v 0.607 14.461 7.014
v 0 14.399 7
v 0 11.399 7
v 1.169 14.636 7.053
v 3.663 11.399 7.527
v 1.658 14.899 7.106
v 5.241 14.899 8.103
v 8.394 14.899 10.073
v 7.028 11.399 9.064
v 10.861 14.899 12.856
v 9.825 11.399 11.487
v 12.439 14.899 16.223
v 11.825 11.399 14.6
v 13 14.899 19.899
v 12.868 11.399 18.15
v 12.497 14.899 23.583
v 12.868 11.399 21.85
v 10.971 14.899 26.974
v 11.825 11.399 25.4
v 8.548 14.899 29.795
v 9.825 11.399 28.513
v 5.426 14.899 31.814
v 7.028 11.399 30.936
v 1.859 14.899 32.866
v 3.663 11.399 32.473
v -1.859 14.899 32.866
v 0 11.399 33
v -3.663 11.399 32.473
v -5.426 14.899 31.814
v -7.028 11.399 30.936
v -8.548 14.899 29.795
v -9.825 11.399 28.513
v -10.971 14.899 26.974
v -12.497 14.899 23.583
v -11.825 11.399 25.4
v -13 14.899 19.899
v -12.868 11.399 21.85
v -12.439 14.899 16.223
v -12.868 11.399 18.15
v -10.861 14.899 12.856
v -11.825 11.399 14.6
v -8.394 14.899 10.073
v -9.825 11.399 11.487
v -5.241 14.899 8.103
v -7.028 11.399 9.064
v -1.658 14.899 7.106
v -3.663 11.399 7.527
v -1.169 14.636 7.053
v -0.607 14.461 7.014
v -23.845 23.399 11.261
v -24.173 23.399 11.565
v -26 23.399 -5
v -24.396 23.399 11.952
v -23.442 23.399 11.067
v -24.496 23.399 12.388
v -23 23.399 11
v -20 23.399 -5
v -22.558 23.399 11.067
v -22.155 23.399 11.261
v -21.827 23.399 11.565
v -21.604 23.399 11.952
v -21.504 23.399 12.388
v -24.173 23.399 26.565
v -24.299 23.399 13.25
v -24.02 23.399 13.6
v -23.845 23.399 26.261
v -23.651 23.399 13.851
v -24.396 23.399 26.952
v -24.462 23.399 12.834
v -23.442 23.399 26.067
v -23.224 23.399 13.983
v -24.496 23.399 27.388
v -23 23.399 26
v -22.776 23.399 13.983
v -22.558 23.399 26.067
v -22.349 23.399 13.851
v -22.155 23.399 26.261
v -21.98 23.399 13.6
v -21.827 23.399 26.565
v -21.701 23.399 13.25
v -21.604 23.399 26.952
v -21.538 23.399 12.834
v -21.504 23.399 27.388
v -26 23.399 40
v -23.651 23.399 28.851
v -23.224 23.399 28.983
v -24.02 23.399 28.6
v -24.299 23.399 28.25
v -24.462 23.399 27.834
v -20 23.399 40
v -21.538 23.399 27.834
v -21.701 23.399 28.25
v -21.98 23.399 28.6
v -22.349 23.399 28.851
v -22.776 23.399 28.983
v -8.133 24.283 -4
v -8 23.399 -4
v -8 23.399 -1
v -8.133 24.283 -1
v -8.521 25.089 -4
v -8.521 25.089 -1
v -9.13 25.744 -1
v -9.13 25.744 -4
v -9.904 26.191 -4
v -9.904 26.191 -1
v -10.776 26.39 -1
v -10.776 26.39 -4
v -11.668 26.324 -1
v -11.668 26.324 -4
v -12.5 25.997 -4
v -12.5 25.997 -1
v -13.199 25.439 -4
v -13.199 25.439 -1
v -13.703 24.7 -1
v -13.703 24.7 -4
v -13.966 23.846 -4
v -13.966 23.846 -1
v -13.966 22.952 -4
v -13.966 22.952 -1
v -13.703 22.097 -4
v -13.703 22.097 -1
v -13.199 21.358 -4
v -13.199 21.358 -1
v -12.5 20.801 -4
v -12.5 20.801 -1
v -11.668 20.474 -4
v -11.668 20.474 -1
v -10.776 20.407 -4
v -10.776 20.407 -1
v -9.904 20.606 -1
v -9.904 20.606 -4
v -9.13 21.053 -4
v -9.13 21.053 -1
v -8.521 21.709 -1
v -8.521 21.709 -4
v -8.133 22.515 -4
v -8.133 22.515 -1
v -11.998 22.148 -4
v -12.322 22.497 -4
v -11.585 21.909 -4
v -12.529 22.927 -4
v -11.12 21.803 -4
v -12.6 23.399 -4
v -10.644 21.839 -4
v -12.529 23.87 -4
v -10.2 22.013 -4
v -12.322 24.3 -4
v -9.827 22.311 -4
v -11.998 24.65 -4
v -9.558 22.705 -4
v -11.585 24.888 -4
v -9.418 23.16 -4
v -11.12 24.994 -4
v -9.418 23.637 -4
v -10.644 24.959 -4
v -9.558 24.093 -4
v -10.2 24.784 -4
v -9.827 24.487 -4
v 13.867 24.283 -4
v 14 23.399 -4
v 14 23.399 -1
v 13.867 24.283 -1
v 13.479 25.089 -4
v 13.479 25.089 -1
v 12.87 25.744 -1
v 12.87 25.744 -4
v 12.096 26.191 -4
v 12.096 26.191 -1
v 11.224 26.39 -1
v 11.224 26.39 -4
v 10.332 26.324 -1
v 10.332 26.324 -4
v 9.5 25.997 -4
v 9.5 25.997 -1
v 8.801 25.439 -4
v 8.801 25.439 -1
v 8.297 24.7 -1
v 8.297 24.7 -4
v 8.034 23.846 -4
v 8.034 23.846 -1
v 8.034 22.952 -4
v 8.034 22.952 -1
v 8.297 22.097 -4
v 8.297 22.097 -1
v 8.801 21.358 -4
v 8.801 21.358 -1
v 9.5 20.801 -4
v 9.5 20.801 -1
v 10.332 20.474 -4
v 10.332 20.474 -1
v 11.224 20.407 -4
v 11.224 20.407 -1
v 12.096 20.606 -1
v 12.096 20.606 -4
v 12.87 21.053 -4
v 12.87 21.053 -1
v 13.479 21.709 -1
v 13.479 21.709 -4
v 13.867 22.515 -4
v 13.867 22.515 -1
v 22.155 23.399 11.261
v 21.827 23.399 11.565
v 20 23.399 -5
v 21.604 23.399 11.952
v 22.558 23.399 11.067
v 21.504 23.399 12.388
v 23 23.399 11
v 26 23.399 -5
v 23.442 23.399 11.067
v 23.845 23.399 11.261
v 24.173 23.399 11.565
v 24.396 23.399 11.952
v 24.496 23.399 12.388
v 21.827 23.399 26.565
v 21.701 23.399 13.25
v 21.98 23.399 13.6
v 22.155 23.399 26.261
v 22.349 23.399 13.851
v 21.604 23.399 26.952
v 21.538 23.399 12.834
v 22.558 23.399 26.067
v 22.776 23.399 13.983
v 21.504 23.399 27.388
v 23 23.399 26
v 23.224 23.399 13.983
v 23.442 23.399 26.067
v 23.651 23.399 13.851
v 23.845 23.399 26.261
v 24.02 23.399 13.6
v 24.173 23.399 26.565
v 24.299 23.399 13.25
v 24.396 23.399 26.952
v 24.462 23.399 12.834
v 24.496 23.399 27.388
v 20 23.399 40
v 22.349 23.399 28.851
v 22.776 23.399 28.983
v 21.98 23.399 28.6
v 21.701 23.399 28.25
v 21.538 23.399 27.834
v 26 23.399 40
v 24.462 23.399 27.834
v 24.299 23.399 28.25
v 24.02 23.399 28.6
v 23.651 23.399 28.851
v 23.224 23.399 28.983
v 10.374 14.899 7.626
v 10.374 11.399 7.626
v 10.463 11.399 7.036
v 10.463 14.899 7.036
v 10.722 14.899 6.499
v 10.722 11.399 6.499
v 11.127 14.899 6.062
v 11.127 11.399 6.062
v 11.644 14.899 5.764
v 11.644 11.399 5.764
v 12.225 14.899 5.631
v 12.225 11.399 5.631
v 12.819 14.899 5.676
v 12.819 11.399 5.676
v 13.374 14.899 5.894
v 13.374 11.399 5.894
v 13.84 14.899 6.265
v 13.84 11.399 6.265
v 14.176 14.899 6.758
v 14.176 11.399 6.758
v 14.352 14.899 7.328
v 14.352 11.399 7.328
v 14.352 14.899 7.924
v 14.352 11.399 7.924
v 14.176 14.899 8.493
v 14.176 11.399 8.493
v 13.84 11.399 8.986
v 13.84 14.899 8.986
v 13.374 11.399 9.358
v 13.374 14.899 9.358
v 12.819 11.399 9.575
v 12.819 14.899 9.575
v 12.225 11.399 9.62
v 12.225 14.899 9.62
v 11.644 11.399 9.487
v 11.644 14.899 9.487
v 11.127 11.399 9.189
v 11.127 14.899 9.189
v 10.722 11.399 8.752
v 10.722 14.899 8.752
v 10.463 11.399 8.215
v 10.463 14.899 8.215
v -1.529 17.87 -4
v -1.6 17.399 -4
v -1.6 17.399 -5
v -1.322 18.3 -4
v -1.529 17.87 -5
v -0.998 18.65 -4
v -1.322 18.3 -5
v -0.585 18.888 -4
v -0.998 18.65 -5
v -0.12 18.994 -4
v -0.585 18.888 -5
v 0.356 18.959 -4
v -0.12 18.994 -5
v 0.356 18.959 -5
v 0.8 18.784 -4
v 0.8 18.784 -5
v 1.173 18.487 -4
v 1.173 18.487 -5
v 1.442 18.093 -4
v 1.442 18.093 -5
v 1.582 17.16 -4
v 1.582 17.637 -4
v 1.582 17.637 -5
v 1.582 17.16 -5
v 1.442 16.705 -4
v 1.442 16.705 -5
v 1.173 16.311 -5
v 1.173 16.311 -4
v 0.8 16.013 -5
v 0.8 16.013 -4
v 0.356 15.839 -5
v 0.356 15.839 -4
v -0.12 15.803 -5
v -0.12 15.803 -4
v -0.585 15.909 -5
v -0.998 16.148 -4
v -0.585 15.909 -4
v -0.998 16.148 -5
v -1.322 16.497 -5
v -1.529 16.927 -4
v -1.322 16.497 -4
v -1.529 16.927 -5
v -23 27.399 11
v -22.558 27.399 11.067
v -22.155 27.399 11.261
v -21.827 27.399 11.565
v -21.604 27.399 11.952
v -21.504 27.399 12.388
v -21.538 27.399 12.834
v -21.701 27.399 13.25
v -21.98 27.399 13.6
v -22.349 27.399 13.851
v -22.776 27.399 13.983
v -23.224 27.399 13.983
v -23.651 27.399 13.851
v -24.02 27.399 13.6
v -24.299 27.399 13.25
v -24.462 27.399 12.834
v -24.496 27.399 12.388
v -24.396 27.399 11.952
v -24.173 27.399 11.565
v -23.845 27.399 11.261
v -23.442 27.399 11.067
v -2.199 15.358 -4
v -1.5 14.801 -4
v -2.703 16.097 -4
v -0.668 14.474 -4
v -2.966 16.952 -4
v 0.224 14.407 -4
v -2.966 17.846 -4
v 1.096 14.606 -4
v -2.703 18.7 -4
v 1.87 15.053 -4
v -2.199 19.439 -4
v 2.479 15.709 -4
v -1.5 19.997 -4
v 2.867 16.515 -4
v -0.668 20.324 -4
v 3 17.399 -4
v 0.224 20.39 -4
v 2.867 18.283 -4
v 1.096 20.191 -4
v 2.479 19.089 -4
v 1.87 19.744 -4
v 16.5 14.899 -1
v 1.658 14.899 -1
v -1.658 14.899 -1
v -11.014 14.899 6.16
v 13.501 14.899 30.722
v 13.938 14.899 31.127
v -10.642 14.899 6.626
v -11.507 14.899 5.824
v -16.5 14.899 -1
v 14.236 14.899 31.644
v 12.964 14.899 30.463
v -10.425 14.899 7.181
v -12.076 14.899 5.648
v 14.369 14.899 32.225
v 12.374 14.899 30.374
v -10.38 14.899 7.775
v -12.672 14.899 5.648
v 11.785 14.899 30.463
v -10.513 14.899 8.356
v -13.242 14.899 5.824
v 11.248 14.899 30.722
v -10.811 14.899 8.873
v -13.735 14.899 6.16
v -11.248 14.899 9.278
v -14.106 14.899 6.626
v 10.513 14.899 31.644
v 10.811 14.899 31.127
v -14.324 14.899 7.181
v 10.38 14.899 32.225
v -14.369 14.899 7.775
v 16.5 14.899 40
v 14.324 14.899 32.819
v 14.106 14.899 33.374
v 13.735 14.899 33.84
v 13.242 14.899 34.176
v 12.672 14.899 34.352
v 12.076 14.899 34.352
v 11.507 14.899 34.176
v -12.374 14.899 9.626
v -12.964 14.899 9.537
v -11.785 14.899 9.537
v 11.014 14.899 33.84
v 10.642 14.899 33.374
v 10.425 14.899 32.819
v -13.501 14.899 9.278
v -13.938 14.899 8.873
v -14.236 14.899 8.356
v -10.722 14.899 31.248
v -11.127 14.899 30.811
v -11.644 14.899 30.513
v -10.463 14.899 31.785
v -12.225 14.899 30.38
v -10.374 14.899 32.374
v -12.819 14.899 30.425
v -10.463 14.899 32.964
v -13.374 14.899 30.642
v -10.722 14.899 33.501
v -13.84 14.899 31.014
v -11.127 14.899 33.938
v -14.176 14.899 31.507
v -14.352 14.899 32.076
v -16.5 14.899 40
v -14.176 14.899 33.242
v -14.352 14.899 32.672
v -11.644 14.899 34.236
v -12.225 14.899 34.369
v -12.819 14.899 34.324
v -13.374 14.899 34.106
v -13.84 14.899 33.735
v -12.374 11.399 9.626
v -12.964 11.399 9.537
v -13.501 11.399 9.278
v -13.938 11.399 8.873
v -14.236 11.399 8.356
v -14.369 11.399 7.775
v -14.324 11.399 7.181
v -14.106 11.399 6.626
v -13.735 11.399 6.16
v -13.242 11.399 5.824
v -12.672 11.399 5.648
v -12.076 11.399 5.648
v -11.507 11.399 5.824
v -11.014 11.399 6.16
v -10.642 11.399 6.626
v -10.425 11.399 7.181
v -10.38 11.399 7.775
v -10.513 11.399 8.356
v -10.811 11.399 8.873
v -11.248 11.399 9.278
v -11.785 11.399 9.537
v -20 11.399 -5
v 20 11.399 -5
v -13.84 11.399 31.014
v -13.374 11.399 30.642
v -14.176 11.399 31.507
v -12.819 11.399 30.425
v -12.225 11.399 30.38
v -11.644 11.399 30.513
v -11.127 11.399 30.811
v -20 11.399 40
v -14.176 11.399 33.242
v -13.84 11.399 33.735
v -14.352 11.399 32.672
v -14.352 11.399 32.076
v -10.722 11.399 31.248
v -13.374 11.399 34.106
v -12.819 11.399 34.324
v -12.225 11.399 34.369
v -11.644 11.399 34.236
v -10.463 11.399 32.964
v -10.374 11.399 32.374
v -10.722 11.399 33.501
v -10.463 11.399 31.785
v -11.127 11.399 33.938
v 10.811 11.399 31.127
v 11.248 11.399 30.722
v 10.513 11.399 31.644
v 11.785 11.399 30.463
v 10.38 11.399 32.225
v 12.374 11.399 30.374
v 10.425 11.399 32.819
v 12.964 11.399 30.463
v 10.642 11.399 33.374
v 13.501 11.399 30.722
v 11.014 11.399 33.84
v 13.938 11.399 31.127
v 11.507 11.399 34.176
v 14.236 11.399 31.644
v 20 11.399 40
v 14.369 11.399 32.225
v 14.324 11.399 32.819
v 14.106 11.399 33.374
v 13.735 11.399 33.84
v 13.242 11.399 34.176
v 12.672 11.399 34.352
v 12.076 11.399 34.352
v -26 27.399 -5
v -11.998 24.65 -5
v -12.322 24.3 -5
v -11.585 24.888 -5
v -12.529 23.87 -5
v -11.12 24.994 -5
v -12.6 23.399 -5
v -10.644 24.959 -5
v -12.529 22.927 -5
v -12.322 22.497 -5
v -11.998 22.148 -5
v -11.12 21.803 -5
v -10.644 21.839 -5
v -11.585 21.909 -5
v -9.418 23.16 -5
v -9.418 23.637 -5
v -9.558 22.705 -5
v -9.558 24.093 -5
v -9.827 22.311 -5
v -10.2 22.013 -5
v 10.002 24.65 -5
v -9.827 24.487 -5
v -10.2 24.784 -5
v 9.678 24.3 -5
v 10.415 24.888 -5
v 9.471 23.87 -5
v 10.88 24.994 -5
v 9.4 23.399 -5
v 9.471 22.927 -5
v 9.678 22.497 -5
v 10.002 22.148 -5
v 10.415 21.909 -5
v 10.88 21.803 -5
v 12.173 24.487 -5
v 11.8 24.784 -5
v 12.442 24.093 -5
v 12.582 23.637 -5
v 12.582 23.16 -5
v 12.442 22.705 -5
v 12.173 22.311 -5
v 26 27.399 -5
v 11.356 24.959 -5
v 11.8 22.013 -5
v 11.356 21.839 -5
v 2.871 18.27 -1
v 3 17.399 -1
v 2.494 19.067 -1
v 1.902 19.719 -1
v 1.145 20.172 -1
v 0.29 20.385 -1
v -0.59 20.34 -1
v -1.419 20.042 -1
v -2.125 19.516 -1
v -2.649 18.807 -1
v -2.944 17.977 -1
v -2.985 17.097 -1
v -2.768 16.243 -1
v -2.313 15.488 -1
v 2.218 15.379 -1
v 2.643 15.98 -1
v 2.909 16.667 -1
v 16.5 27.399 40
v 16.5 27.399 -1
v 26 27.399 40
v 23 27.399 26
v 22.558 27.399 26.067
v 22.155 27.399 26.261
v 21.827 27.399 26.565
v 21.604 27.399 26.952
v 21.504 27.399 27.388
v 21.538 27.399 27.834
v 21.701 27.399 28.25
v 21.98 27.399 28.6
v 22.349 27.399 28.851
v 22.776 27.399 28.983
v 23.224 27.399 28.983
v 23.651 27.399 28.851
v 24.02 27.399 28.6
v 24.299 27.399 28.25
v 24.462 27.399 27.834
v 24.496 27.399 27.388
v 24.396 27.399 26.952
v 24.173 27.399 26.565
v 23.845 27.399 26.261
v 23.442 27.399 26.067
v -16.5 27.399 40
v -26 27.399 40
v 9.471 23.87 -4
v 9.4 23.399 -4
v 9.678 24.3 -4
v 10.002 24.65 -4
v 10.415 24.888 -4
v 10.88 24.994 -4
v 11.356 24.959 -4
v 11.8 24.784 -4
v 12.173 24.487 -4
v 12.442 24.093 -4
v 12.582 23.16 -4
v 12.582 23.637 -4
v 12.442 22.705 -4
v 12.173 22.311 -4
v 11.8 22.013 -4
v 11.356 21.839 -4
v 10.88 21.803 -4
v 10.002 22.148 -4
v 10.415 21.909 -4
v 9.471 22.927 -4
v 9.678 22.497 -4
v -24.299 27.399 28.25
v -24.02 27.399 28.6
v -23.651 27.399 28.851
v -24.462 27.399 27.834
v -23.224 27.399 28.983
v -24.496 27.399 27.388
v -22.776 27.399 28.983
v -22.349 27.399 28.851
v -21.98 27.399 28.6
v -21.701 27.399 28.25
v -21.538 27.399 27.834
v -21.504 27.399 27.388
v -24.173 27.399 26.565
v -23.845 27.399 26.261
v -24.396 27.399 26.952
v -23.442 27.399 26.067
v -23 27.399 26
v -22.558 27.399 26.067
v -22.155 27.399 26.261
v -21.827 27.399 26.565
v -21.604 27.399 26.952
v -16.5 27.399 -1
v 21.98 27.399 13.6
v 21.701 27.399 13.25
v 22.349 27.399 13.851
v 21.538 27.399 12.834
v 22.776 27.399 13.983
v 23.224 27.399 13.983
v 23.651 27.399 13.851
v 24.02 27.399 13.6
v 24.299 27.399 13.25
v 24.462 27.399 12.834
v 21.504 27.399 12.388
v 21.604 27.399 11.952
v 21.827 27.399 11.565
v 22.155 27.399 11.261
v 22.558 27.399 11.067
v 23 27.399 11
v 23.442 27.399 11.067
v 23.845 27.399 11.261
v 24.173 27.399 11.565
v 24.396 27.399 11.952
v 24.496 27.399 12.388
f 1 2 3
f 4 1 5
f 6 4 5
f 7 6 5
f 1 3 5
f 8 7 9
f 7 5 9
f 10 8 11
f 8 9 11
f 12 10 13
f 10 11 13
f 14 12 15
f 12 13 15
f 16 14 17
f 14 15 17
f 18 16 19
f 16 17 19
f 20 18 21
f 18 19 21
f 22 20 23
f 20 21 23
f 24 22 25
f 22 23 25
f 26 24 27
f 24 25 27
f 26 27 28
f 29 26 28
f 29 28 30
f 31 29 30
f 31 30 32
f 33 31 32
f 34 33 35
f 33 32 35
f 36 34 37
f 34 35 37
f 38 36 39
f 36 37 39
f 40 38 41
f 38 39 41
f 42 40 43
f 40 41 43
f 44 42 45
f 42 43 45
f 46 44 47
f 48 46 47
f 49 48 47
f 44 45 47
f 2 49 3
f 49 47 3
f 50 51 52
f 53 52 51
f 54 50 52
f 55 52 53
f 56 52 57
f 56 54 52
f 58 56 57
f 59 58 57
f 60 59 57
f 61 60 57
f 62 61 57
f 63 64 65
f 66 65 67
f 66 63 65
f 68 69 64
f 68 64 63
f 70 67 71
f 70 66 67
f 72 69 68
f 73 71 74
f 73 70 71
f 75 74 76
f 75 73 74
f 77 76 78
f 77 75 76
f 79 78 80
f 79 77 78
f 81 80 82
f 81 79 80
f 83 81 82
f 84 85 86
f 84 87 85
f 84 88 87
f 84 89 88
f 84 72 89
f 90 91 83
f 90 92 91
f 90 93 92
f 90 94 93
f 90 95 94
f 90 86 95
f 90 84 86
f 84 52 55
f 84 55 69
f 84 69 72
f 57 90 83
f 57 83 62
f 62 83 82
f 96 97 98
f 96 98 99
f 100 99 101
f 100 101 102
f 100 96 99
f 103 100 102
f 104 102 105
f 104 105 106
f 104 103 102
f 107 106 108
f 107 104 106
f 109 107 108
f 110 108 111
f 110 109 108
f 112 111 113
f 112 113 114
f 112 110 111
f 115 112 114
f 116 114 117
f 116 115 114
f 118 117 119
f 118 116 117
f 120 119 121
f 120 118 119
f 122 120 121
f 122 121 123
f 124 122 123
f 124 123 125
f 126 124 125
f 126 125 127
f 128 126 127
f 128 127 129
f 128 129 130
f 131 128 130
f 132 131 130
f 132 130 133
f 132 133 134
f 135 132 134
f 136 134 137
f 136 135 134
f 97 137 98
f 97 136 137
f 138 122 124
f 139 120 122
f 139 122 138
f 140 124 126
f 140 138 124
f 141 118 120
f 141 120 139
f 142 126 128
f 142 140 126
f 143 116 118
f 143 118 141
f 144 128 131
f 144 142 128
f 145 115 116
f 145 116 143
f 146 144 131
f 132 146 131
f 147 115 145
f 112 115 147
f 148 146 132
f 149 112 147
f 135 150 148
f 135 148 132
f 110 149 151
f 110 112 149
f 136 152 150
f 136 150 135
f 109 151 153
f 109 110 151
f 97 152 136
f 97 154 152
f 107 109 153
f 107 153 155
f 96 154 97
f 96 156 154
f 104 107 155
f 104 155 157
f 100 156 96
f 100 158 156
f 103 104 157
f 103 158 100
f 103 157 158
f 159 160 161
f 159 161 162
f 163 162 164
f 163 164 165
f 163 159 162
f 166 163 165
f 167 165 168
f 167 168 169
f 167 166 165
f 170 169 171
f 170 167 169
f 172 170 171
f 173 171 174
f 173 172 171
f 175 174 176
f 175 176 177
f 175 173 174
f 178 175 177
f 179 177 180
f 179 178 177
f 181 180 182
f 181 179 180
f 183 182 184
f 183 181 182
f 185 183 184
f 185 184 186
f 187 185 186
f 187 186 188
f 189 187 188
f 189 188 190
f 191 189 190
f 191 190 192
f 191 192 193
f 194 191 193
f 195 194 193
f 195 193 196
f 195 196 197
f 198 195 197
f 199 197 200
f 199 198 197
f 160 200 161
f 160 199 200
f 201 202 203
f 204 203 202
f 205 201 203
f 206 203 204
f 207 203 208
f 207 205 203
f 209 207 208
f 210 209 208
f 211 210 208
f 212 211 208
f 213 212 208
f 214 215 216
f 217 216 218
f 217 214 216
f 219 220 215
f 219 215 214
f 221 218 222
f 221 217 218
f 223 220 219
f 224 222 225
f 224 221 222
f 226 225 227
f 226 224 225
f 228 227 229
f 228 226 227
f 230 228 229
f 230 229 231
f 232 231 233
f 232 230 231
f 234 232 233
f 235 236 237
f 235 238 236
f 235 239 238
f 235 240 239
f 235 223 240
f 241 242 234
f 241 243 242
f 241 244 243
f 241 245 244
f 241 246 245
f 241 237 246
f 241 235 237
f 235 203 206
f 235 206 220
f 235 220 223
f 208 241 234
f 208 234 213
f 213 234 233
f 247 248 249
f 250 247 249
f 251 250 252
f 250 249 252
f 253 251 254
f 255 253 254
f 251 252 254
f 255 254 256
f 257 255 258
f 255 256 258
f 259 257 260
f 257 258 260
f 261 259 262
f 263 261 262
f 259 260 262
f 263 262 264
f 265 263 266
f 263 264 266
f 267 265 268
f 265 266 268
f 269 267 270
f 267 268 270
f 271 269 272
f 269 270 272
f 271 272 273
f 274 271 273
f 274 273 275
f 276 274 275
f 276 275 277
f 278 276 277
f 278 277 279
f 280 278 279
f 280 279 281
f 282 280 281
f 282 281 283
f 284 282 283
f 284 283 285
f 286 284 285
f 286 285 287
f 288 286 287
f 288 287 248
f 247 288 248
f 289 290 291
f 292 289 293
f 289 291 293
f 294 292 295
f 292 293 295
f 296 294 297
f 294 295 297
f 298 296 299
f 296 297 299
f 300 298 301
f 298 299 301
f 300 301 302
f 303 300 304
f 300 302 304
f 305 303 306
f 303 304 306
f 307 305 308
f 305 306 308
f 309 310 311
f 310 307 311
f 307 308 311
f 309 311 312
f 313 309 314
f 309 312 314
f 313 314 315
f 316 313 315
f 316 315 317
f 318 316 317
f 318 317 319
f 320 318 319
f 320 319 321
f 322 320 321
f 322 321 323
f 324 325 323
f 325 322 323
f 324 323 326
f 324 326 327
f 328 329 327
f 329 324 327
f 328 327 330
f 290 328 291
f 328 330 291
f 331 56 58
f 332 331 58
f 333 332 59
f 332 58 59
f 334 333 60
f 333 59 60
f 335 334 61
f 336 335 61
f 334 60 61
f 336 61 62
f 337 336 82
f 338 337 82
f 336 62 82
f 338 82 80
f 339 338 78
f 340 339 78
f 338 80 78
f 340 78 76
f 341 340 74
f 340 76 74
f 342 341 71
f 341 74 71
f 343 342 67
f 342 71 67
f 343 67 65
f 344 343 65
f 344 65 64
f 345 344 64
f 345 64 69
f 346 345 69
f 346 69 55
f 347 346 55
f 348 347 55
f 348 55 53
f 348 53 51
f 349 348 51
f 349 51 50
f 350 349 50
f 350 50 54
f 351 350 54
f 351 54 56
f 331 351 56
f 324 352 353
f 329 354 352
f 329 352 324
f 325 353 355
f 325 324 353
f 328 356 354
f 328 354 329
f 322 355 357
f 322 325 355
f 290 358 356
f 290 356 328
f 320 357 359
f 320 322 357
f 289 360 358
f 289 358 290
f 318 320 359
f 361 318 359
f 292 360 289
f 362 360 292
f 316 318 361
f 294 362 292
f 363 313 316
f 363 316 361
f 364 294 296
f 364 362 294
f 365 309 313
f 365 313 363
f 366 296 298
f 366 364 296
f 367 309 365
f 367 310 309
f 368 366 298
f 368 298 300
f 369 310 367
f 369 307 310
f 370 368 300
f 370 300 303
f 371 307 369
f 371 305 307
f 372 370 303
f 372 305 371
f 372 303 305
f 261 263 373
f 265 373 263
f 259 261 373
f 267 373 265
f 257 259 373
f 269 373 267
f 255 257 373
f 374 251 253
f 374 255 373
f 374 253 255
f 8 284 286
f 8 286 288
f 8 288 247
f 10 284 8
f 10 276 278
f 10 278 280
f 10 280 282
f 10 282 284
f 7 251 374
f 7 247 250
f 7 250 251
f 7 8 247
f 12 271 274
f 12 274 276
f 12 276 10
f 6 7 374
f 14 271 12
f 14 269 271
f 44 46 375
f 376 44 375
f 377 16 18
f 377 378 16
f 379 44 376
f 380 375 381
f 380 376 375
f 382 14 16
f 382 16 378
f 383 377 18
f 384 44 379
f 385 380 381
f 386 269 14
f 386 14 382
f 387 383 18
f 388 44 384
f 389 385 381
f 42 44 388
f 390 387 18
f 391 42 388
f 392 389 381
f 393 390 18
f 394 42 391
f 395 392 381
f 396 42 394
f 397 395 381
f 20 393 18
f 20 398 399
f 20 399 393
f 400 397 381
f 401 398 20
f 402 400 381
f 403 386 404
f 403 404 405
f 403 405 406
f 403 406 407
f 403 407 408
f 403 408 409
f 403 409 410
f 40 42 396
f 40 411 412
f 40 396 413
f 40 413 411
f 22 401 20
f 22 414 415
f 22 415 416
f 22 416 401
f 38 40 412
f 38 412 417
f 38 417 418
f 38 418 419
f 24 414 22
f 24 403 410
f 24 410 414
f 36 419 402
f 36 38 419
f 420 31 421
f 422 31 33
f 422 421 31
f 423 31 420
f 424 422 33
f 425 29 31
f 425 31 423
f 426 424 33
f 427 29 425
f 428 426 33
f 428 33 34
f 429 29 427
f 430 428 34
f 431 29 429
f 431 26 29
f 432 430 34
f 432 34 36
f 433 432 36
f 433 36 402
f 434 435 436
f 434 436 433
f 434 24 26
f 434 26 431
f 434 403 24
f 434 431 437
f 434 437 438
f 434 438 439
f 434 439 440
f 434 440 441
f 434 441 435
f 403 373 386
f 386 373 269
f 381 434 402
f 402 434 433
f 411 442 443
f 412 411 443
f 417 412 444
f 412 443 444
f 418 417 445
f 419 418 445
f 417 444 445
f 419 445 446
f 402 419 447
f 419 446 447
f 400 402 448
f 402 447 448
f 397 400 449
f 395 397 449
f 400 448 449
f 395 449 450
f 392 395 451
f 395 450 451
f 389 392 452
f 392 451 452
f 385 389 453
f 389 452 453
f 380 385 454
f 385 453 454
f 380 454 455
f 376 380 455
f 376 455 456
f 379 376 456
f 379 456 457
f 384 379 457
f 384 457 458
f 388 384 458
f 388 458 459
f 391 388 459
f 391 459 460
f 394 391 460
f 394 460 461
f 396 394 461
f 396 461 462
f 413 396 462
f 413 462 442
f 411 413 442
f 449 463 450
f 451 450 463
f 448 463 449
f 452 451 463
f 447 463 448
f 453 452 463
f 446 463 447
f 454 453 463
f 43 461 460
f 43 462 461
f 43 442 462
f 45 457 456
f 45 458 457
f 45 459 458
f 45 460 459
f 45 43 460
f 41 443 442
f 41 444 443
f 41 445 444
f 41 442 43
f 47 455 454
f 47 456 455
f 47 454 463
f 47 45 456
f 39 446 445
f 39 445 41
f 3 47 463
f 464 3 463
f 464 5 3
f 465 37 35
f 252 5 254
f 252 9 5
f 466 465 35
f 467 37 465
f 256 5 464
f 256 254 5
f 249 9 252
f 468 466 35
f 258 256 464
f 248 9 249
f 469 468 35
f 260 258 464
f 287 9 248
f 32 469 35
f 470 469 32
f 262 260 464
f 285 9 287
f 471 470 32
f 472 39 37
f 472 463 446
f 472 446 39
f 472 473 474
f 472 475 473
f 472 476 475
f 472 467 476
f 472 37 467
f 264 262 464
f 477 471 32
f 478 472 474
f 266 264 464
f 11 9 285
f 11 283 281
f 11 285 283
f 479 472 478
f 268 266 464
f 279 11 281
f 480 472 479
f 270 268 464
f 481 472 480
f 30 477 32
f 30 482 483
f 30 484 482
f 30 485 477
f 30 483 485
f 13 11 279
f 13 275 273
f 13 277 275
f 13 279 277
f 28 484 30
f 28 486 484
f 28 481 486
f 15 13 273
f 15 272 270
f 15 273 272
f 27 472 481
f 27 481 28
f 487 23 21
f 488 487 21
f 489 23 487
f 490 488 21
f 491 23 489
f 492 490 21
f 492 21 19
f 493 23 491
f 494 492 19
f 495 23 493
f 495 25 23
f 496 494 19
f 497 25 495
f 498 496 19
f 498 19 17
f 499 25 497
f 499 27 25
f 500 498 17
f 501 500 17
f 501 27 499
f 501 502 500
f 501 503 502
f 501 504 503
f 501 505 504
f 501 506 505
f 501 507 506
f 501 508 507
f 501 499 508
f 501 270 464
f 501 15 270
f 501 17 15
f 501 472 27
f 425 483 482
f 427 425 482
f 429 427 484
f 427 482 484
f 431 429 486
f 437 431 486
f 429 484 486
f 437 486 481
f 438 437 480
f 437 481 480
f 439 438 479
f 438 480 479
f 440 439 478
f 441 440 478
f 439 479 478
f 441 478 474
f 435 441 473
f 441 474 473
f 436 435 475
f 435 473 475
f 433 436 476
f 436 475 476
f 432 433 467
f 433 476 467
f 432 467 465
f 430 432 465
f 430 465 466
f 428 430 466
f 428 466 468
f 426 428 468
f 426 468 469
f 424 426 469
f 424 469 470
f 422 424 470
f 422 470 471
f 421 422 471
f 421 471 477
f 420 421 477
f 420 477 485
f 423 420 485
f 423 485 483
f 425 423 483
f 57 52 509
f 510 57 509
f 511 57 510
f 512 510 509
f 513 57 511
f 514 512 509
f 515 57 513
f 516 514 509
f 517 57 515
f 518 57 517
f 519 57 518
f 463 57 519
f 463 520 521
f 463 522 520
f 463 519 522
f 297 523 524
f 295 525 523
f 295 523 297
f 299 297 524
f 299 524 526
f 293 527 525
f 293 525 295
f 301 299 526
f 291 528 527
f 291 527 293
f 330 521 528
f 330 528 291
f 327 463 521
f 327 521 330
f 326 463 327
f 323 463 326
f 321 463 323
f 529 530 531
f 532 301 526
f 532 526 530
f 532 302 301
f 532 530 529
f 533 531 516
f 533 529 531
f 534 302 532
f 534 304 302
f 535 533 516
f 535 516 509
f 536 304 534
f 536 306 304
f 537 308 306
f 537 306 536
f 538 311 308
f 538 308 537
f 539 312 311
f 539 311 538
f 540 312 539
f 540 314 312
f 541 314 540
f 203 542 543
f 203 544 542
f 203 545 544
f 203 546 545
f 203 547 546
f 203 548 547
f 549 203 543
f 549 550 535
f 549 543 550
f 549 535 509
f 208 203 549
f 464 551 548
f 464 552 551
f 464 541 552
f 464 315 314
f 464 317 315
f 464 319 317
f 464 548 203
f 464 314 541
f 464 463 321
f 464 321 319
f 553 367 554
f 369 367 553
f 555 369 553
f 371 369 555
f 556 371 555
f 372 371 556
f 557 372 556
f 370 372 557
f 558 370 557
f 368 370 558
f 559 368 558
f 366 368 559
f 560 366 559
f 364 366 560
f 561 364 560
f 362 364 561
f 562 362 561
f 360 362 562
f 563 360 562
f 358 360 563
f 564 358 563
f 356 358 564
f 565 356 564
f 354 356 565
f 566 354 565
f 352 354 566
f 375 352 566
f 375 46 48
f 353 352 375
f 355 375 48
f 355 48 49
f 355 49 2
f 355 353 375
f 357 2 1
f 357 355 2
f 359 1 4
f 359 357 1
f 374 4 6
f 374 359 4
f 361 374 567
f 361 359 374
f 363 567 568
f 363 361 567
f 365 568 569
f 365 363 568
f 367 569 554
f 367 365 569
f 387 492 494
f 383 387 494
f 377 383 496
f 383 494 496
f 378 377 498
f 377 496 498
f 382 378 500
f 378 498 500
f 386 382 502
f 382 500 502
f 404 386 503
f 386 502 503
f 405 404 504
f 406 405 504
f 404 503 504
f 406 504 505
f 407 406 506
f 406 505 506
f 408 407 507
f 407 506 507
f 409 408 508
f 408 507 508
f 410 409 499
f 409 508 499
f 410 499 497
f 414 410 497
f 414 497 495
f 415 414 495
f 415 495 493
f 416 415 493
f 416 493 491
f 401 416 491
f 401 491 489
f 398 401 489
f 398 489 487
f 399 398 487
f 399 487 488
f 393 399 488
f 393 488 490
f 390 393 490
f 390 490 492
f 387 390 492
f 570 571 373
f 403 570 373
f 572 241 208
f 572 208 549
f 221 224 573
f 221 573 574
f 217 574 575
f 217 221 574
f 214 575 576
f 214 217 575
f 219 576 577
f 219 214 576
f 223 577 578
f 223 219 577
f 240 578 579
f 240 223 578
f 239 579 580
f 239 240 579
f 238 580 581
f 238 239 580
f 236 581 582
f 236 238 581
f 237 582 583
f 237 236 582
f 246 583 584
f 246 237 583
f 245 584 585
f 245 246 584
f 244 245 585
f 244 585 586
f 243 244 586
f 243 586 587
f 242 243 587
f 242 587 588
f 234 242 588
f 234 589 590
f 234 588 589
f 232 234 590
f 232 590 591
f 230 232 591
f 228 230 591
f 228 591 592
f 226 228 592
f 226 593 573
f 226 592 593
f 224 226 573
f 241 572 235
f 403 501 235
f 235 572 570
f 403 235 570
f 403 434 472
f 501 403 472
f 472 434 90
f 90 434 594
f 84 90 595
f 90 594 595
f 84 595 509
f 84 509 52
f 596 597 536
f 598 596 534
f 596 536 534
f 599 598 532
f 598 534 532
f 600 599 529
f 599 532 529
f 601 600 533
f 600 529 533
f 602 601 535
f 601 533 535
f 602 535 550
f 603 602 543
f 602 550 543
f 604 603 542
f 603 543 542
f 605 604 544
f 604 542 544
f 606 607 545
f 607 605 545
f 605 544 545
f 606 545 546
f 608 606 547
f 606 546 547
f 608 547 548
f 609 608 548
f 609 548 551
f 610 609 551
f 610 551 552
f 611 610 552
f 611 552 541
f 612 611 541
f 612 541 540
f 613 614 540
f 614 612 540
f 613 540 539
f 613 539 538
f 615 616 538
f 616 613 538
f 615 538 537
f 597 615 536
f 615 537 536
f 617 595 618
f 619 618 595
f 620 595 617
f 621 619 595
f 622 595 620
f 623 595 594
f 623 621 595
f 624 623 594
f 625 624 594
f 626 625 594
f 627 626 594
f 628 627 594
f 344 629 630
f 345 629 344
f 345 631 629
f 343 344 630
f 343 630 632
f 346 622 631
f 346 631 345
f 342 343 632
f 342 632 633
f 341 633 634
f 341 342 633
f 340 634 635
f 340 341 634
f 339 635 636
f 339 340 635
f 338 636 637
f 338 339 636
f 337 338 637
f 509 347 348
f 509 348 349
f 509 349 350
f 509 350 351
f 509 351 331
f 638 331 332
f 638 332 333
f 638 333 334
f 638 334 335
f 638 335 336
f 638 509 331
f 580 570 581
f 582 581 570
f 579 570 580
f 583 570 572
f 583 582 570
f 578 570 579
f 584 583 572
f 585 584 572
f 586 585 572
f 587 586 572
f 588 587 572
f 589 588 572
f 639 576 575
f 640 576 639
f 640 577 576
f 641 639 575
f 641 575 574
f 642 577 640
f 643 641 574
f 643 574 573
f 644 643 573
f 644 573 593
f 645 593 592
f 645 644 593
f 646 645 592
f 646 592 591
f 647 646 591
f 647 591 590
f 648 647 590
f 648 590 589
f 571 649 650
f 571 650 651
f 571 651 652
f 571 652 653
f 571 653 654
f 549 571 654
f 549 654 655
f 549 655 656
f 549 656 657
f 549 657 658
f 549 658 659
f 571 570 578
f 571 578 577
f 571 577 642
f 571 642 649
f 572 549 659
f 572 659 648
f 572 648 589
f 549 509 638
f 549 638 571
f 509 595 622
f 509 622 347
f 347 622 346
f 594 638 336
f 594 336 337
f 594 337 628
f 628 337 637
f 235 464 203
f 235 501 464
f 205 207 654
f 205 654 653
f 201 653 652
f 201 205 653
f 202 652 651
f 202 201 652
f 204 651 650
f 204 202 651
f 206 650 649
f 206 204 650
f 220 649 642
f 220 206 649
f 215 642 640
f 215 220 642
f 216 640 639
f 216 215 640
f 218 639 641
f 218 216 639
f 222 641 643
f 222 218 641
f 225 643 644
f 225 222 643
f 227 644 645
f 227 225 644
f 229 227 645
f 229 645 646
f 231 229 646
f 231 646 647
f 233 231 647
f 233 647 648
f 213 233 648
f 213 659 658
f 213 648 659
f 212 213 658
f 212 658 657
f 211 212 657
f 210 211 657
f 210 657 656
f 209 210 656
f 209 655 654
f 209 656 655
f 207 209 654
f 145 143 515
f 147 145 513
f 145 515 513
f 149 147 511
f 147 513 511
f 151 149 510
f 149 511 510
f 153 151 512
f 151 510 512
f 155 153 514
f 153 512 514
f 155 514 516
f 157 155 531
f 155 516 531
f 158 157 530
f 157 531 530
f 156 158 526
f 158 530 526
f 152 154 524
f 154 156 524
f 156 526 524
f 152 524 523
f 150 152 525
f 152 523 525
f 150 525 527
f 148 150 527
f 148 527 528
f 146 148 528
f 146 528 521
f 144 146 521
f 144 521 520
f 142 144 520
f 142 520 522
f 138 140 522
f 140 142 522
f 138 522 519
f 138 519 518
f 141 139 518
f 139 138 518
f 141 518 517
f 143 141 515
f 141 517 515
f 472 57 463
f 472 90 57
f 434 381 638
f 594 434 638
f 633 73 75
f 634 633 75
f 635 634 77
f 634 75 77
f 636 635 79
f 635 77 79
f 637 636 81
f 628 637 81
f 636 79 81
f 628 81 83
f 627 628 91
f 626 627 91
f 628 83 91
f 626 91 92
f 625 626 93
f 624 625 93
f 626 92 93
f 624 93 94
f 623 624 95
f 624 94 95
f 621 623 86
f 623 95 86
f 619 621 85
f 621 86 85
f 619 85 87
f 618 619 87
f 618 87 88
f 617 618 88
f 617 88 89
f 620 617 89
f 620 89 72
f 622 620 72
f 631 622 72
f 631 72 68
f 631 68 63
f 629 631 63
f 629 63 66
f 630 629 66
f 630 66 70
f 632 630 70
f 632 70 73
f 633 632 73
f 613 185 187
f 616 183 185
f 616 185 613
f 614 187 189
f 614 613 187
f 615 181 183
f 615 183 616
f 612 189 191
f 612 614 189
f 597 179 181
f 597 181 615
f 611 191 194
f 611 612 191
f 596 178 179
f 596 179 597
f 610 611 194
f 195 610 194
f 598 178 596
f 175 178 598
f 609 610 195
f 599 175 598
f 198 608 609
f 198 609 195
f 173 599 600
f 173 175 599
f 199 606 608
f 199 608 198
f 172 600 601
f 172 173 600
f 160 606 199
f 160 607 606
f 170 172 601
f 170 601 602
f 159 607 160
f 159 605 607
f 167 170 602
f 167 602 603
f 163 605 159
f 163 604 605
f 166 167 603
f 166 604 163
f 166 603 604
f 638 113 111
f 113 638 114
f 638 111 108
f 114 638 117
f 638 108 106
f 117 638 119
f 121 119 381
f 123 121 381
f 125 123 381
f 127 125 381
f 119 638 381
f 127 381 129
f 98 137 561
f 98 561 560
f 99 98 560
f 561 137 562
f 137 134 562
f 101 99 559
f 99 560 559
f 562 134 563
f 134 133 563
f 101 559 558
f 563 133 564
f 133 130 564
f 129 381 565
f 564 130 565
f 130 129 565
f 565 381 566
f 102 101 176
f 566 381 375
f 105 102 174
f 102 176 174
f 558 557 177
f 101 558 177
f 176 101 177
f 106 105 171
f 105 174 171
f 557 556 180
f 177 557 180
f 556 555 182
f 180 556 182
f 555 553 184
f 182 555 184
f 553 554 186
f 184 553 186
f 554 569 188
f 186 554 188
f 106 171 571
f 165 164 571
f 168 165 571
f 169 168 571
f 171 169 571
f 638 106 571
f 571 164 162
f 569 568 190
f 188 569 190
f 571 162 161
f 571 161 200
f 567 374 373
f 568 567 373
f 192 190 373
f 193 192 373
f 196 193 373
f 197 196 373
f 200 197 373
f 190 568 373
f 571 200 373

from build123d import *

# Parameters (mm, degrees)
EXTRUDE_1_DEPTH          = 40
SKETCH_2_R               = 13
CUT_EXTRUDE_1_DEPTH      = 1.5
SKETCH_3_R               = 13
CUT_EXTRUDE_2_DEPTH      = 50.862310416
CUT_EXTRUDE_3_REACH      = 52.319
SKETCH_4_R               = 2
PATTERN_CIRCULAR_1_COUNT = 4
SKETCH_5_R               = 1.5
CUT_EXTRUDE_4_DEPTH      = 49.744230428
SKETCH_6_W               = 33
SKETCH_6_H               = 40
CUT_EXTRUDE_5_DEPTH      = 1.5
SKETCH_7_W               = 6
SKETCH_7_H               = 40
CUT_EXTRUDE_6_DEPTH      = 2
EXTRUDE_2_DEPTH          = 5
SKETCH_9_W               = 33
SKETCH_9_H               = 4
EXTRUDE_3_DEPTH          = 12.5
SKETCH_10_R              = 1.6
CUT_EXTRUDE_7_DEPTH      = 4
CUT_EXTRUDE_START        = -3
SKETCH_11_R              = 3
SKETCH_11_R_2            = 1.6
CUT_EXTRUDE_8_DEPTH      = 3
SKETCH_12_R              = 3
CUT_EXTRUDE_9_DEPTH      = 14


with BuildPart() as part:
    # 草图1 → 凸台-拉伸1 (new body)
    with BuildSketch(Plane.XY):
        Polygon((-16.5, 27.398785639), (-16.5, 16.398785639), (16.5, 16.398785639), (16.5, 27.398785639), (26, 27.398785639), (26, 21.398785639), (20, 21.398785639), (20, 16.398785639), (20, 11.398785639), (-20, 11.398785639), (-20, 21.398785639), (-26, 21.398785639), (-26, 27.398785639), align=None)
    extrude(amount=EXTRUDE_1_DEPTH)

    # 草图2 → 切除-拉伸1 (cut)
    with BuildSketch(Plane.XZ.offset(-11.398785639)):
        with Locations(Location((0, 20, 0), (0, 0, 270))):
            Circle(SKETCH_2_R)
    extrude(amount=-CUT_EXTRUDE_1_DEPTH, mode=Mode.SUBTRACT)

    # 草图3 → 切除-拉伸2 (cut, through all)
    with BuildSketch(Plane.XZ.offset(-12.898785639)):
        with Locations(Location((0, 20, 0), (0, 0, 270))):
            Circle(SKETCH_3_R)
    extrude(amount=-CUT_EXTRUDE_2_DEPTH, mode=Mode.SUBTRACT)

    # 草图4 → 切除-拉伸3 (cut, up to next)
    with BuildSketch(Plane.XZ.offset(-11.398785639), mode=Mode.PRIVATE) as cut_extrude_3_sk1:
        with Locations(Location((12.374368671, 32.374368671, 0), (0, 0, 270))):
            Circle(SKETCH_4_R)
    cut_extrude_3_tool1 = extrude(cut_extrude_3_sk1.sketch, amount=-CUT_EXTRUDE_3_REACH, mode=Mode.PRIVATE) & part.part
    cut_extrude_3 = cut_extrude_3_tool1.solids().sort_by_distance((12.374369, 11.398786, 32.374369))[0]
    add(cut_extrude_3, mode=Mode.SUBTRACT)

    # 阵列(圆周)1: 切除-拉伸3 ×4 about axis
    pattern_circular_1_axis = Axis((0, 0, 20), (0, 1, 0))
    for i in range(1, PATTERN_CIRCULAR_1_COUNT):
        add(cut_extrude_3.rotate(pattern_circular_1_axis, i * 360 / PATTERN_CIRCULAR_1_COUNT), mode=Mode.SUBTRACT)

    # 草图5 → 切除-拉伸4 (cut, through all)
    with BuildSketch(Plane.XZ.offset(-21.398785639)):
        with Locations(Location((-23, 27.5, 0), (0, 0, 270))):
            Circle(SKETCH_5_R)
        with Locations(Location((-23, 12.5, 0), (0, 0, 270))):
            Circle(SKETCH_5_R)
    cut_extrude_4 = extrude(amount=-CUT_EXTRUDE_4_DEPTH, mode=Mode.SUBTRACT)

    # 镜向1: 切除-拉伸4 across plane
    add(cut_extrude_4.mirror(Plane.ZY), mode=Mode.SUBTRACT)

    # 草图6 → 切除-拉伸5 (cut)
    with BuildSketch(Plane(origin=(0, 16.398785639, 0), x_dir=(1, 0, 0), z_dir=(0, 1, 0))):
        with Locations((0, -20)):
            Rectangle(SKETCH_6_W, SKETCH_6_H)
    extrude(amount=-CUT_EXTRUDE_5_DEPTH, mode=Mode.SUBTRACT)

    # 草图7 → 切除-拉伸6 (cut)
    with BuildSketch(Plane.XZ.offset(-21.398785639)):
        with Locations((-23, 20)):
            Rectangle(SKETCH_7_W, SKETCH_7_H)
        with Locations((23, 20)):
            Rectangle(SKETCH_7_W, SKETCH_7_H)
    extrude(amount=-CUT_EXTRUDE_6_DEPTH, mode=Mode.SUBTRACT)

    # 草图8 → 凸台-拉伸2 (add)
    with BuildSketch(Plane.XY):
        Polygon((20, 11.398785639), (20, 23.398785639), (26, 23.398785639), (26, 27.398785639), (16.5, 27.398785639), (16.5, 14.898785639), (-16.5, 14.898785639), (-16.5, 27.398785639), (-26, 27.398785639), (-26, 23.398785639), (-20, 23.398785639), (-20, 11.398785639), align=None)
    extrude(amount=-EXTRUDE_2_DEPTH)

    # 草图9 → 凸台-拉伸3 (add)
    with BuildSketch(Plane(origin=(0, 14.898785639, 0), x_dir=(1, 0, 0), z_dir=(0, 1, 0))):
        with Locations((0, 3)):
            Rectangle(SKETCH_9_W, SKETCH_9_H)
    extrude(amount=EXTRUDE_3_DEPTH)

    # 草图10 → 切除-拉伸7 (cut)
    with BuildSketch(Plane(origin=(0, 0, -5), x_dir=(-1, 0, 0), z_dir=(0, 0, -1))):
        with Locations((-11, 23.398785639)):
            Circle(SKETCH_10_R)
        with Locations((0, 17.398785639)):
            Circle(SKETCH_10_R)
        with Locations((11, 23.398785639)):
            Circle(SKETCH_10_R)
    extrude(amount=-CUT_EXTRUDE_7_DEPTH, mode=Mode.SUBTRACT)

    # 草图11 → 切除-拉伸8 (cut)
    # profile 1 of 3: a face of its own
    with BuildSketch(Plane.XY.offset(-1).offset(CUT_EXTRUDE_START)):
        with Locations((-11, 23.398785639)):
            Circle(SKETCH_11_R)
        with Locations(Location((-11, 23.398785639, 0), (0, 0, 180))):
            Circle(SKETCH_11_R_2, mode=Mode.SUBTRACT)
    # profile 2 of 3: a face of its own
    with BuildSketch(Plane.XY.offset(-1).offset(CUT_EXTRUDE_START)):
        with Locations((0, 17.398785639)):
            Circle(SKETCH_11_R)
        with Locations(Location((0, 17.398785639, 0), (0, 0, 180))):
            Circle(SKETCH_11_R_2, mode=Mode.SUBTRACT)
    # profile 3 of 3: a face of its own
    with BuildSketch(Plane.XY.offset(-1).offset(CUT_EXTRUDE_START)):
        with Locations((11, 23.398785639)):
            Circle(SKETCH_11_R)
        with Locations(Location((11, 23.398785639, 0), (0, 0, 180))):
            Circle(SKETCH_11_R_2, mode=Mode.SUBTRACT)
    extrude(amount=CUT_EXTRUDE_8_DEPTH, mode=Mode.SUBTRACT)

    # 草图12 → 切除-拉伸9 (cut)
    with BuildSketch(Plane.XY.offset(-1)):
        with Locations((0, 17.398785639)):
            Circle(SKETCH_12_R)
    extrude(amount=CUT_EXTRUDE_9_DEPTH, mode=Mode.SUBTRACT)


solid = part.part
